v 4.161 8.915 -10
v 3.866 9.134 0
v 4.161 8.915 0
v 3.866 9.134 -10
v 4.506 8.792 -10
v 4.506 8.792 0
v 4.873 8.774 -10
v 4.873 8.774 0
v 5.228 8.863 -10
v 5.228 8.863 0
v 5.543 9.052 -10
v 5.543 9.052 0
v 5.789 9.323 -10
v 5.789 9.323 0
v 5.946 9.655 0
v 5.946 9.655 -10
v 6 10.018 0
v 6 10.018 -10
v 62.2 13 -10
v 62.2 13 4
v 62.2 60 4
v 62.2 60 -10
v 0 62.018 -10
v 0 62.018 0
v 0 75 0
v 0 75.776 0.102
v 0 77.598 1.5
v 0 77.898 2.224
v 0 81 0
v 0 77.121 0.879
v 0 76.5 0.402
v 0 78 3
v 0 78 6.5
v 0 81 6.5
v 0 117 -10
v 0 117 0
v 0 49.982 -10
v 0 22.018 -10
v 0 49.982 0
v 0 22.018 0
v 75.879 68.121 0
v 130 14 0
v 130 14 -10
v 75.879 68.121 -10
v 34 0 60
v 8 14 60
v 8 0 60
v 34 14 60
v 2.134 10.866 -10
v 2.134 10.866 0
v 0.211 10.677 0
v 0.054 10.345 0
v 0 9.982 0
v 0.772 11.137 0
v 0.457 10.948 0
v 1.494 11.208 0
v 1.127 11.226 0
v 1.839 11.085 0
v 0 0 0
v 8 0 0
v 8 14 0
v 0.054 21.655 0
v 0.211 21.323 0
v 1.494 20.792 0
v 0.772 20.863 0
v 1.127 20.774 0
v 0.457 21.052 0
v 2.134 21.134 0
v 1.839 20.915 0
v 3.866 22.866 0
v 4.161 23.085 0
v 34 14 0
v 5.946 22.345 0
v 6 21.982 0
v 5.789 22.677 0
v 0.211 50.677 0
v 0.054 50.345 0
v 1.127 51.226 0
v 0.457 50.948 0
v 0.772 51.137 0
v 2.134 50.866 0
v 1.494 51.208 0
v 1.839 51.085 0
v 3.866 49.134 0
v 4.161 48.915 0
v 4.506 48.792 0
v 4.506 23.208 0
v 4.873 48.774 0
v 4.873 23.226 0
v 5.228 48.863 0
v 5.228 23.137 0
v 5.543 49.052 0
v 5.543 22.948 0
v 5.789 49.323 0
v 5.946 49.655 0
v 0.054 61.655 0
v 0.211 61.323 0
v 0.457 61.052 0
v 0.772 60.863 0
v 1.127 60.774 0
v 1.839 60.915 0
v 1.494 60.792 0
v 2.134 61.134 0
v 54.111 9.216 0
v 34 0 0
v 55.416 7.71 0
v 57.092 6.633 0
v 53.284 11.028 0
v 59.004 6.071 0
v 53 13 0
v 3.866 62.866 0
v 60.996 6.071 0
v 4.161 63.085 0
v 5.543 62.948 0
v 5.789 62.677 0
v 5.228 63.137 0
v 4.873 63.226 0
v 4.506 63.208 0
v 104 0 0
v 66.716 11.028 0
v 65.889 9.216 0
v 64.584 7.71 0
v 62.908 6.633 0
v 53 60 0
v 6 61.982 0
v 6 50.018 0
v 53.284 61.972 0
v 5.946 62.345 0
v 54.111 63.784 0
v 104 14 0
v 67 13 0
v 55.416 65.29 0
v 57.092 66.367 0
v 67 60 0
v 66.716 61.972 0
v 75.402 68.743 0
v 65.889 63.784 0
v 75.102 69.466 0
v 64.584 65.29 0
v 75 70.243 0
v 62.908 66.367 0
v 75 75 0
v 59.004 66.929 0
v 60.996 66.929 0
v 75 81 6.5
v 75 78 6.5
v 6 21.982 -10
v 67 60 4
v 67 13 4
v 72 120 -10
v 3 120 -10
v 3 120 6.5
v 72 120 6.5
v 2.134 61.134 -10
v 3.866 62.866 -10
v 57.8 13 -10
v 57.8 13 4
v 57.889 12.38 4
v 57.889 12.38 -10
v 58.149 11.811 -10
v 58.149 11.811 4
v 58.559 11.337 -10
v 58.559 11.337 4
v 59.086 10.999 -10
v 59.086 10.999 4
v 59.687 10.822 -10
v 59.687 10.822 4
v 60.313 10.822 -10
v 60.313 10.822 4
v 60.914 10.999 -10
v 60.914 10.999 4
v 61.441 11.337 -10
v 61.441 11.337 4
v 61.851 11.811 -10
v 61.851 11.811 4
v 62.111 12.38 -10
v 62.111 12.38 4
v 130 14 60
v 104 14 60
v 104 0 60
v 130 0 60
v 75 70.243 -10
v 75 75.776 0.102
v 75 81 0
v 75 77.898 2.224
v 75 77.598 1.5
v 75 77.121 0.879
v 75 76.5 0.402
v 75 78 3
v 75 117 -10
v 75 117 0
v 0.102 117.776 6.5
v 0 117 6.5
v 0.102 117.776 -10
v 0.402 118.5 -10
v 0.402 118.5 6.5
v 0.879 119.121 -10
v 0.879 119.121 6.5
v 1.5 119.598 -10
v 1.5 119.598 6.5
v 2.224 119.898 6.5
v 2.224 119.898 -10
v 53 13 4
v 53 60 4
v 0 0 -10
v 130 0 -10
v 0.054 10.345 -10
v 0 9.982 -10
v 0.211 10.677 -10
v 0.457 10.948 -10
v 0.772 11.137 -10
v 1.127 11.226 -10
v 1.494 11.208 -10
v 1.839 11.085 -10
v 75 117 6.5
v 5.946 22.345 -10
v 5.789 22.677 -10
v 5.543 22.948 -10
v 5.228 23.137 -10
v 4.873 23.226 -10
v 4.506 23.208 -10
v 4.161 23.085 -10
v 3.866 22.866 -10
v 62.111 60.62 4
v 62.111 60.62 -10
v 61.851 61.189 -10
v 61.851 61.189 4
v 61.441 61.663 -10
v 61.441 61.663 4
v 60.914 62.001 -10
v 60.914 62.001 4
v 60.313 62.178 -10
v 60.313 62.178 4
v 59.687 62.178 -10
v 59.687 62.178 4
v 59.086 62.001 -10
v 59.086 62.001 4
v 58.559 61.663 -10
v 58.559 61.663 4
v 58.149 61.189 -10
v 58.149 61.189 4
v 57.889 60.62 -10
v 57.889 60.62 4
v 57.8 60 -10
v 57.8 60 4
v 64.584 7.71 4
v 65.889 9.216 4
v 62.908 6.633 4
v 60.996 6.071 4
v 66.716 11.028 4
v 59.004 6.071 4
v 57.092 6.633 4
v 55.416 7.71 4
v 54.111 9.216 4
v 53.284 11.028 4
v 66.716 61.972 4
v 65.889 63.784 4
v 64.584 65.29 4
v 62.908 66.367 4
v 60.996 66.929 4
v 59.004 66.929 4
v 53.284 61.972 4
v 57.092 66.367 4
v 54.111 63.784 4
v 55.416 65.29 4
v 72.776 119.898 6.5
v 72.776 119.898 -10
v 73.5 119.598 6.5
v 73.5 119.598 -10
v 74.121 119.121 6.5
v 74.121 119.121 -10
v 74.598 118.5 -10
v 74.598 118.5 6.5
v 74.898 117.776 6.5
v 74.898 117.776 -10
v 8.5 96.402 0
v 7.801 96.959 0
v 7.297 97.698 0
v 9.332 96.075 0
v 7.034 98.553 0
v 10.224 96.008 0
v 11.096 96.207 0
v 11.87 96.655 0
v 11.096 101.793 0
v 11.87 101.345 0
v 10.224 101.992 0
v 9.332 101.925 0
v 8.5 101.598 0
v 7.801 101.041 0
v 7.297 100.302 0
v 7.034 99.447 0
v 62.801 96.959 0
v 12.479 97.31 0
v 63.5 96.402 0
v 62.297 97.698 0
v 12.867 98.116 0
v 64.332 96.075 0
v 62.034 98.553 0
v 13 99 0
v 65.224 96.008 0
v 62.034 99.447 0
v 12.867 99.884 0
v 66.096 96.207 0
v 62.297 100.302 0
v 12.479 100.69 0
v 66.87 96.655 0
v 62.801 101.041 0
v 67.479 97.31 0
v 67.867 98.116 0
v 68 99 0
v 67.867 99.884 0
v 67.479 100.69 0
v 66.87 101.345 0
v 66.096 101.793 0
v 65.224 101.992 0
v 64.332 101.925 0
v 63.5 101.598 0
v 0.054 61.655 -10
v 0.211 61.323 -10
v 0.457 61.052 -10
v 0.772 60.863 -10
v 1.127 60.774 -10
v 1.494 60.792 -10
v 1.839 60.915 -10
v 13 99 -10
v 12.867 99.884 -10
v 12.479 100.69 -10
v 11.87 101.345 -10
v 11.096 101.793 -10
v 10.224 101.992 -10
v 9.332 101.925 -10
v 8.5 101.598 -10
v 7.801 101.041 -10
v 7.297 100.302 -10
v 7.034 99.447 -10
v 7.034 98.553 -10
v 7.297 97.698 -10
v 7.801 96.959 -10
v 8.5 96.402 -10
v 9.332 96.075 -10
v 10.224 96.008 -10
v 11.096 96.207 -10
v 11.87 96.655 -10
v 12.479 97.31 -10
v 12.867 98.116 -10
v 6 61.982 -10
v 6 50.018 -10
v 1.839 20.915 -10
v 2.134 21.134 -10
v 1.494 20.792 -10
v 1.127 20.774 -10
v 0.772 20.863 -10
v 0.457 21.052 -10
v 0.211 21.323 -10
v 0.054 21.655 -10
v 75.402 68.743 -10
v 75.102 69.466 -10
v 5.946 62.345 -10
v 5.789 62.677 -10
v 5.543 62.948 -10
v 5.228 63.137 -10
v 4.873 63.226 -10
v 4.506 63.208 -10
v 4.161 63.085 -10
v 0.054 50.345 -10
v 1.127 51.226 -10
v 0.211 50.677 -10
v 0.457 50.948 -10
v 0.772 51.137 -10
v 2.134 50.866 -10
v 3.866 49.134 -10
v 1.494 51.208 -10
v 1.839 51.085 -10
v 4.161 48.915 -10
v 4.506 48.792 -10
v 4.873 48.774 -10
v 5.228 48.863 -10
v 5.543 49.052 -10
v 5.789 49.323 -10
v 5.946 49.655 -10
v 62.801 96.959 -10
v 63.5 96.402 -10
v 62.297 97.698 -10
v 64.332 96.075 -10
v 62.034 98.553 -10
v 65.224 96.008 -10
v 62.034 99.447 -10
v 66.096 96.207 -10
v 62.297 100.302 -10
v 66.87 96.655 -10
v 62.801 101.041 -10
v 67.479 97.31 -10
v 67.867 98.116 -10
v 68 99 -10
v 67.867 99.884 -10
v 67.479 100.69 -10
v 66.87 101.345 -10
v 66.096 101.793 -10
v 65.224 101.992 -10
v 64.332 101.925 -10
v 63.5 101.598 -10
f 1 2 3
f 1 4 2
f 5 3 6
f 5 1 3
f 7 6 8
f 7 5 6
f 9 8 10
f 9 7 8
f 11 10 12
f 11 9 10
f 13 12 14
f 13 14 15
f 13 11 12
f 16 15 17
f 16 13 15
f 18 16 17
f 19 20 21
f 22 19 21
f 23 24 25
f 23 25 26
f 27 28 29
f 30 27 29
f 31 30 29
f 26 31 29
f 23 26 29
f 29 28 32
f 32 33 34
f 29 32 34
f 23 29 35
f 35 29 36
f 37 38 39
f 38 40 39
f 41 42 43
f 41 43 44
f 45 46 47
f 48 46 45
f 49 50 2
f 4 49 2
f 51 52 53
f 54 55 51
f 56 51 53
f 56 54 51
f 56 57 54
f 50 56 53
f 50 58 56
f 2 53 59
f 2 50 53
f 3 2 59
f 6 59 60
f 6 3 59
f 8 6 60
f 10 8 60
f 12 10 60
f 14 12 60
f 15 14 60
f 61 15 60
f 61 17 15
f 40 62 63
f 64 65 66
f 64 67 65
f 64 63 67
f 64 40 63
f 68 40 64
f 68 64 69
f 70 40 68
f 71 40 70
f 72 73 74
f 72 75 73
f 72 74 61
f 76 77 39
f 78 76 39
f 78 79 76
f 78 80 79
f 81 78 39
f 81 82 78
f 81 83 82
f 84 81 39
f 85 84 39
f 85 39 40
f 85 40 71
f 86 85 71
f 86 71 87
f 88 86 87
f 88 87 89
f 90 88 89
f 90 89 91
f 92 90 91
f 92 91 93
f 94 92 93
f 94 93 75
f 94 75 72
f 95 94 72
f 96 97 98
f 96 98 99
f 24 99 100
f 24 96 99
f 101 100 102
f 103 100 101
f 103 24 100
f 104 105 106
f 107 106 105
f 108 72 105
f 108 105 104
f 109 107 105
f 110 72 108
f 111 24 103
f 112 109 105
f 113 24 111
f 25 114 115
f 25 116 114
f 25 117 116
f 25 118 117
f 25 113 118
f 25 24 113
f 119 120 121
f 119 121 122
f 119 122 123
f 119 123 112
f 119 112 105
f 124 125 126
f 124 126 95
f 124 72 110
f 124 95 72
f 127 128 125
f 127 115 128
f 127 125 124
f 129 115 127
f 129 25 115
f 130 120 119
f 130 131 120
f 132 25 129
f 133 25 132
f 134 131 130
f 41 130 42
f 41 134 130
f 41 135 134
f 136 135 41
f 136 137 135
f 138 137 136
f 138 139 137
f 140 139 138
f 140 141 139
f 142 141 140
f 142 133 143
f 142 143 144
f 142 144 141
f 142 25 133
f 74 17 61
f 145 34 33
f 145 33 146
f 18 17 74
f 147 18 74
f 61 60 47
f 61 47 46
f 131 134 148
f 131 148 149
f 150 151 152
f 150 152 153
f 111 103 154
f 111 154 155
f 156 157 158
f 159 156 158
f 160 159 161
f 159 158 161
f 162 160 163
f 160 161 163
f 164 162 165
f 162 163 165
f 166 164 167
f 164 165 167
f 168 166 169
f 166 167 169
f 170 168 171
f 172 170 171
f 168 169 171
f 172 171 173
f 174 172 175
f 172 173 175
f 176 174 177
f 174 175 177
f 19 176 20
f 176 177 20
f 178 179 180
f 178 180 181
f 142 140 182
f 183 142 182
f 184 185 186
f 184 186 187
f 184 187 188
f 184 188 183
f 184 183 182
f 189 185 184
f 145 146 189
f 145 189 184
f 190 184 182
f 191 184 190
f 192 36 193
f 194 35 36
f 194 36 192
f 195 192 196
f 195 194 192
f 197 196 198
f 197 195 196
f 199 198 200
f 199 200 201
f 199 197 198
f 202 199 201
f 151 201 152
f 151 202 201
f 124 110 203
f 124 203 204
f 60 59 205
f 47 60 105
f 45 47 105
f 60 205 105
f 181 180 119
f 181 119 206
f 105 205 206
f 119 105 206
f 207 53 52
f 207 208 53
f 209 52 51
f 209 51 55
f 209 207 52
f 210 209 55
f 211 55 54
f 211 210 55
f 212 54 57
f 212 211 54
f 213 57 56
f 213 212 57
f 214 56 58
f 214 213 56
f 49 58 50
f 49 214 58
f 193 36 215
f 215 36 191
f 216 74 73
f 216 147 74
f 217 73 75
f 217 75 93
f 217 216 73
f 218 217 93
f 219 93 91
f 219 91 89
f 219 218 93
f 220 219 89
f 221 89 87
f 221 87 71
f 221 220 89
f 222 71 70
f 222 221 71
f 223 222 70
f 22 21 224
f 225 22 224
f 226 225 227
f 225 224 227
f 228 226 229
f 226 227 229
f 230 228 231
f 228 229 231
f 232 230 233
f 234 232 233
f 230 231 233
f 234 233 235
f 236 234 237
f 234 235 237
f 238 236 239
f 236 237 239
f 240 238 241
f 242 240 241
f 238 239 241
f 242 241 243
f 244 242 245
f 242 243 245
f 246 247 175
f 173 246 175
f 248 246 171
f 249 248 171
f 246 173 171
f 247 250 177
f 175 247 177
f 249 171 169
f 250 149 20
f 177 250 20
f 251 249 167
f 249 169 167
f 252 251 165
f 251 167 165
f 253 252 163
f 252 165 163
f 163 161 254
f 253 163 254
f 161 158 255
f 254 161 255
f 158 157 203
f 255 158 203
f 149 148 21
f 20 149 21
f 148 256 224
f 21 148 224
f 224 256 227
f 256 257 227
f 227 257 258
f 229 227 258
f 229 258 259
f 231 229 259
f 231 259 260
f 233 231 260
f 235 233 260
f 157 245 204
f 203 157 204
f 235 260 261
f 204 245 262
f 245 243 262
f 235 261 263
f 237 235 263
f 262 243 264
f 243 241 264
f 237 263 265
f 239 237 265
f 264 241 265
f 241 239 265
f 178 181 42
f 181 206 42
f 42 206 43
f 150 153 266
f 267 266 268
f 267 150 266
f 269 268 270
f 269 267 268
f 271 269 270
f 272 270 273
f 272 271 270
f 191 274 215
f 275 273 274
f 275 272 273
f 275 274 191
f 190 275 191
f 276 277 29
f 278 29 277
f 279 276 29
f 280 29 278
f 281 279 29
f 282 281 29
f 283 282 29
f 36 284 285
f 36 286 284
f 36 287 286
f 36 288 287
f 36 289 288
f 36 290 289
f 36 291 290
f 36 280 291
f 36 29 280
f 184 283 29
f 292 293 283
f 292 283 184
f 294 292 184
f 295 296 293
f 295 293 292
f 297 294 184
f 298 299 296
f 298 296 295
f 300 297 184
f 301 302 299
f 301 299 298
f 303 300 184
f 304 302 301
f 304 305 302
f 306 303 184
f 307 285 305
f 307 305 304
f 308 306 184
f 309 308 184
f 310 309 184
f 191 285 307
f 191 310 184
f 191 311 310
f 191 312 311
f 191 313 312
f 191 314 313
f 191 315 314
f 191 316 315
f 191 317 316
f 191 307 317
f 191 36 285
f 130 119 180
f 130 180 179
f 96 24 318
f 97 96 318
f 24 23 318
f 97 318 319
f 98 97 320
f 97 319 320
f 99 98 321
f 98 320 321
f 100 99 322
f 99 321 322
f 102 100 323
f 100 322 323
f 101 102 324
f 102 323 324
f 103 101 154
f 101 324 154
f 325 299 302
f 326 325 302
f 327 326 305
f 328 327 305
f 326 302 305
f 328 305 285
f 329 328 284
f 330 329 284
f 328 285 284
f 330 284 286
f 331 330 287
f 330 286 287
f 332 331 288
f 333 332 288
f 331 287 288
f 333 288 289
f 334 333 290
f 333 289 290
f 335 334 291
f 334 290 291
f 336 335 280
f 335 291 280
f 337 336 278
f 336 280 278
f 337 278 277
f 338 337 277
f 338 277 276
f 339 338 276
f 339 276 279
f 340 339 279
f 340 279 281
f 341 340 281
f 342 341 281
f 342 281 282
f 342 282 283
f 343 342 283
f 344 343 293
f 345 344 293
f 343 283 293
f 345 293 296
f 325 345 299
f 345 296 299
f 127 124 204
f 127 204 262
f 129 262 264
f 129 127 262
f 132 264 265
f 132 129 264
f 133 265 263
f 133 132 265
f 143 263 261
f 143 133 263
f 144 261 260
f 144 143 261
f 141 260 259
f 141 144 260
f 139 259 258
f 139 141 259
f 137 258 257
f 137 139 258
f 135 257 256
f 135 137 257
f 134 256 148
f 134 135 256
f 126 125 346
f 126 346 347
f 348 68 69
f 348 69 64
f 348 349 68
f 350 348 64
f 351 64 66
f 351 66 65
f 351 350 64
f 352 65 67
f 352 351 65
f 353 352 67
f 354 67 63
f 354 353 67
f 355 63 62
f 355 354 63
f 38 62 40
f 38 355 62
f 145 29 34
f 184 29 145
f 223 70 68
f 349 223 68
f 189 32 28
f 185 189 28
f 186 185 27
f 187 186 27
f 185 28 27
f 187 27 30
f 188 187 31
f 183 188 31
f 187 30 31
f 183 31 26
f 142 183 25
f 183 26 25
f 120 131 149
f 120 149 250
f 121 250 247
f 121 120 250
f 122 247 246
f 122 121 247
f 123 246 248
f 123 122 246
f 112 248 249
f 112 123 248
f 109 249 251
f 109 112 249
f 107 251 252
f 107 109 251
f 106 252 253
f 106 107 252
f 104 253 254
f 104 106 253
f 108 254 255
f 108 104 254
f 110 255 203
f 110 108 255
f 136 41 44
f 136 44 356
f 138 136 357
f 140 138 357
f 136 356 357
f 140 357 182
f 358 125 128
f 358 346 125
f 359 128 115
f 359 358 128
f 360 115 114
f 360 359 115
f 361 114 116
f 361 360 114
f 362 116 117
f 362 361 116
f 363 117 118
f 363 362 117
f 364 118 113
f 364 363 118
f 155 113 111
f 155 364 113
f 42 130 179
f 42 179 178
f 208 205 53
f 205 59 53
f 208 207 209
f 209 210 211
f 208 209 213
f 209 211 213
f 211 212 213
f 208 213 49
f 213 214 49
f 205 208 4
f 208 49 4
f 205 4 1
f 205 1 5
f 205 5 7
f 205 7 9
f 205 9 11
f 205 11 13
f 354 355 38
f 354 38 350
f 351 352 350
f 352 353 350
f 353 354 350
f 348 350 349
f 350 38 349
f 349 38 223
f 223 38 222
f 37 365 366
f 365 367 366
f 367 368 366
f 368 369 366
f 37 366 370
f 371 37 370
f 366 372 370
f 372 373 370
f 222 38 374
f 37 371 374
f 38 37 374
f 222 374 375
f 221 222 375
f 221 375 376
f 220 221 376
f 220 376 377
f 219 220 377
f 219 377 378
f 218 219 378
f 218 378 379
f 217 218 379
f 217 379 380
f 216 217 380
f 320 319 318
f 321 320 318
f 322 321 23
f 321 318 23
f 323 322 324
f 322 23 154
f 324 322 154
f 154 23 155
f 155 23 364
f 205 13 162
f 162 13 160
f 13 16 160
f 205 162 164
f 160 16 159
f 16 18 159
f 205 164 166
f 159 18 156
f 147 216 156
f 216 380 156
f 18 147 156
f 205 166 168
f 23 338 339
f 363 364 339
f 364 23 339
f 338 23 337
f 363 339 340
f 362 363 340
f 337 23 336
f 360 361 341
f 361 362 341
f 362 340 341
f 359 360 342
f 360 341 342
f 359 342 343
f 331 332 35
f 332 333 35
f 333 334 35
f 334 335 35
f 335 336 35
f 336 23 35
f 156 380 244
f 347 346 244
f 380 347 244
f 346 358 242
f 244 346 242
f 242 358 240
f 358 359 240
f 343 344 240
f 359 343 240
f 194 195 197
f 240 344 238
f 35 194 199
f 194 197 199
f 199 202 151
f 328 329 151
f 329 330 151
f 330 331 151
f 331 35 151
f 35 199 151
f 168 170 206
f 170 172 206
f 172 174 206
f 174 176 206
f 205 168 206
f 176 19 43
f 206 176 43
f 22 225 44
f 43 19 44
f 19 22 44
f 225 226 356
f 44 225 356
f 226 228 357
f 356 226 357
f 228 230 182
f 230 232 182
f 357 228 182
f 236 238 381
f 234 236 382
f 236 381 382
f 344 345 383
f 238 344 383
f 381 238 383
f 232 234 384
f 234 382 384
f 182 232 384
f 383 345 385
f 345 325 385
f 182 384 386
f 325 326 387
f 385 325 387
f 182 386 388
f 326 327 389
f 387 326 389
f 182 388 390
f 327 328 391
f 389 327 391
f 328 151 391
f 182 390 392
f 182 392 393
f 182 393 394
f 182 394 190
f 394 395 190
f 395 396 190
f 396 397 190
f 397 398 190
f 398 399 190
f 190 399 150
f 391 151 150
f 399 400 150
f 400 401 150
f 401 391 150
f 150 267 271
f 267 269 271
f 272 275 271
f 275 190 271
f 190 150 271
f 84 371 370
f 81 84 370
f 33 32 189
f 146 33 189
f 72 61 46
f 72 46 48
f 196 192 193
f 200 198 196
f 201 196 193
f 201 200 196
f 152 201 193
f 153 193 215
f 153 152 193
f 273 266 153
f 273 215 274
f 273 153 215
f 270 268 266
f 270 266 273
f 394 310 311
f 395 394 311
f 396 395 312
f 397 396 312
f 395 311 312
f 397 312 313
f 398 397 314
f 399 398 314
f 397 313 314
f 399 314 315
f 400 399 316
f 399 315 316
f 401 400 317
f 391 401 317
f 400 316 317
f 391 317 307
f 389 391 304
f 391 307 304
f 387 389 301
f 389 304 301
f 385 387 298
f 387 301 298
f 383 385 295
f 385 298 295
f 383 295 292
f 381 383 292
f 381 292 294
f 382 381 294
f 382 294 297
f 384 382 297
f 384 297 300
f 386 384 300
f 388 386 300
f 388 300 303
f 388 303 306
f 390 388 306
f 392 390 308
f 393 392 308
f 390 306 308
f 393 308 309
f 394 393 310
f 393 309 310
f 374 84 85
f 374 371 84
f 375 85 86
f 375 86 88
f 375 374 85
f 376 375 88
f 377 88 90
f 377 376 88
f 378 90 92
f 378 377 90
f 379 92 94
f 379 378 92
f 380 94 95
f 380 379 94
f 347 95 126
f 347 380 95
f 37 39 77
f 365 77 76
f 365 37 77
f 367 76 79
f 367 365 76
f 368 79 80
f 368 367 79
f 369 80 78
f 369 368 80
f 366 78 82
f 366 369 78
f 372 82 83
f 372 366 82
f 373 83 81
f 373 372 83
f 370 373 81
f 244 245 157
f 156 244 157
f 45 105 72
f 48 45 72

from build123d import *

# Parameters (mm, degrees)
BOSS_EXTRUDE1_DEPTH = 10
SKETCH3_W           = 75
SKETCH3_H           = 3
BOSS_EXTRUDE2_DEPTH = 6.5
SKETCH4_R           = 3
CUT_EXTRUDE2_DEPTH  = 10
SKETCH5_W           = 26
SKETCH5_H           = 14
BOSS_EXTRUDE3_DEPTH = 60
BOSS_EXTRUDE5_DEPTH = 4
CUT_EXTRUDE3_DEPTH  = 186.569394028
FILLET2_START       = -10
FILLET2_DEPTH       = 10
FILLET2_2_DEPTH     = 75
FILLET2_START_2     = -11
FILLET2_3_DEPTH     = 18
CUT_EXTRUDE4_DEPTH  = 187.815416923
FILLET3_R           = 1.25


with BuildPart() as part:
    # Sketch2 → Boss-Extrude1 (new body)
    with BuildSketch(Plane.XY):
        Polygon((0, 0), (130, 0), (130, 14), (75, 69), (75, 120), (0, 120), align=None)
    extrude(amount=-BOSS_EXTRUDE1_DEPTH)

    # Sketch3 → Boss-Extrude2 (add)
    with BuildSketch(Plane.XY):
        with Locations((37.5, 118.5)):
            Rectangle(SKETCH3_W, SKETCH3_H)
        with Locations((37.5, 79.5)):
            Rectangle(SKETCH3_W, SKETCH3_H)
    extrude(amount=BOSS_EXTRUDE2_DEPTH)

    # Sketch4 → Cut-Extrude2 (cut)
    with BuildSketch(Plane.XY):
        with Locations((10, 99)):
            Circle(SKETCH4_R)
        with Locations((65, 99)):
            Circle(SKETCH4_R)
    extrude(amount=-CUT_EXTRUDE2_DEPTH, mode=Mode.SUBTRACT)

    # Sketch5 → Boss-Extrude3 (add)
    with BuildSketch(Plane.XY):
        with Locations((117, 7)):
            Rectangle(SKETCH5_W, SKETCH5_H)
        with Locations((21, 7)):
            Rectangle(SKETCH5_W, SKETCH5_H)
    extrude(amount=BOSS_EXTRUDE3_DEPTH)

    # Sketch7 → Boss-Extrude5 (add)
    with BuildSketch(Plane.XY):
        with BuildLine():
            Line((53, 13), (53, 60))
            ThreePointArc((53, 60), (60, 67), (67, 60))
            Line((67, 60), (67, 13))
            ThreePointArc((67, 13), (60, 6), (53, 13))
        make_face()
    extrude(amount=BOSS_EXTRUDE5_DEPTH)

    # Sketch8 → Cut-Extrude3 (cut, through all)
    with BuildSketch(Plane.XY.offset(4)):
        with BuildLine():
            Line((62.2, 13), (62.2, 60))
            ThreePointArc((62.2, 60), (60, 62.2), (57.8, 60))
            Line((57.8, 60), (57.8, 13))
            ThreePointArc((57.8, 13), (60, 10.8), (62.2, 13))
        make_face()
    extrude(amount=-CUT_EXTRUDE3_DEPTH, mode=Mode.SUBTRACT)

    # Fillet2: read off the stored shape, not the designer's step
    # Fillet2 outline → Fillet2 (add)
    with BuildSketch(Plane.XY.offset(FILLET2_START)):
        with BuildLine():
            ThreePointArc((75.878679656, 68.121320344), (75.228361402, 69.09459039), (75, 70.242640687))
            Line((75, 70.242640687), (75, 69))
            Line((75, 69), (75.878679656, 68.121320344))
        make_face()
    extrude(amount=FILLET2_DEPTH)

    # Fillet2 2 outline → Fillet2 2 (add)
    with BuildSketch(Plane.YZ):
        with BuildLine():
            ThreePointArc((78, 3), (77.121320344, 0.878679656), (75, 0))
            Line((75, 0), (78, 0))
            Line((78, 0), (78, 3))
        make_face()
    extrude(amount=FILLET2_2_DEPTH)

    # Fillet2 3 outline → Fillet2 3 (cut)
    with BuildSketch(Plane.XY.offset(FILLET2_START_2)):
        with BuildLine():
            ThreePointArc((0, 117), (0.878679656, 119.121320344), (3, 120))
            Line((3, 120), (0, 120))
            Line((0, 120), (0, 117))
        make_face()
        with BuildLine():
            ThreePointArc((72, 120), (74.121320344, 119.121320344), (75, 117))
            Line((75, 117), (75, 120))
            Line((75, 120), (72, 120))
        make_face()
    extrude(amount=FILLET2_3_DEPTH, mode=Mode.SUBTRACT)

    # Sketch6 → Cut-Extrude4 (cut, through all)
    with BuildSketch(Plane.XY):
        Polygon((0, 13), (6, 7), (6, 25), (0, 19), align=None)
        Polygon((6, 47), (0, 53), (0, 59), (6, 65), align=None)
    extrude(amount=-CUT_EXTRUDE4_DEPTH, mode=Mode.SUBTRACT)

    # Fillet3
    fillet3_edges = [part.edges().sort_by_distance(p)[0] for p in [
        (0, 13, -5),
        (0, 19, -5),
        (6, 25, -5),
        (6, 7, -5),
        (6, 65, -5),
        (6, 47, -5),
        (0, 53, -5),
        (0, 59, -5),
    ]]
    fillet(fillet3_edges, radius=FILLET3_R)


solid = part.part
